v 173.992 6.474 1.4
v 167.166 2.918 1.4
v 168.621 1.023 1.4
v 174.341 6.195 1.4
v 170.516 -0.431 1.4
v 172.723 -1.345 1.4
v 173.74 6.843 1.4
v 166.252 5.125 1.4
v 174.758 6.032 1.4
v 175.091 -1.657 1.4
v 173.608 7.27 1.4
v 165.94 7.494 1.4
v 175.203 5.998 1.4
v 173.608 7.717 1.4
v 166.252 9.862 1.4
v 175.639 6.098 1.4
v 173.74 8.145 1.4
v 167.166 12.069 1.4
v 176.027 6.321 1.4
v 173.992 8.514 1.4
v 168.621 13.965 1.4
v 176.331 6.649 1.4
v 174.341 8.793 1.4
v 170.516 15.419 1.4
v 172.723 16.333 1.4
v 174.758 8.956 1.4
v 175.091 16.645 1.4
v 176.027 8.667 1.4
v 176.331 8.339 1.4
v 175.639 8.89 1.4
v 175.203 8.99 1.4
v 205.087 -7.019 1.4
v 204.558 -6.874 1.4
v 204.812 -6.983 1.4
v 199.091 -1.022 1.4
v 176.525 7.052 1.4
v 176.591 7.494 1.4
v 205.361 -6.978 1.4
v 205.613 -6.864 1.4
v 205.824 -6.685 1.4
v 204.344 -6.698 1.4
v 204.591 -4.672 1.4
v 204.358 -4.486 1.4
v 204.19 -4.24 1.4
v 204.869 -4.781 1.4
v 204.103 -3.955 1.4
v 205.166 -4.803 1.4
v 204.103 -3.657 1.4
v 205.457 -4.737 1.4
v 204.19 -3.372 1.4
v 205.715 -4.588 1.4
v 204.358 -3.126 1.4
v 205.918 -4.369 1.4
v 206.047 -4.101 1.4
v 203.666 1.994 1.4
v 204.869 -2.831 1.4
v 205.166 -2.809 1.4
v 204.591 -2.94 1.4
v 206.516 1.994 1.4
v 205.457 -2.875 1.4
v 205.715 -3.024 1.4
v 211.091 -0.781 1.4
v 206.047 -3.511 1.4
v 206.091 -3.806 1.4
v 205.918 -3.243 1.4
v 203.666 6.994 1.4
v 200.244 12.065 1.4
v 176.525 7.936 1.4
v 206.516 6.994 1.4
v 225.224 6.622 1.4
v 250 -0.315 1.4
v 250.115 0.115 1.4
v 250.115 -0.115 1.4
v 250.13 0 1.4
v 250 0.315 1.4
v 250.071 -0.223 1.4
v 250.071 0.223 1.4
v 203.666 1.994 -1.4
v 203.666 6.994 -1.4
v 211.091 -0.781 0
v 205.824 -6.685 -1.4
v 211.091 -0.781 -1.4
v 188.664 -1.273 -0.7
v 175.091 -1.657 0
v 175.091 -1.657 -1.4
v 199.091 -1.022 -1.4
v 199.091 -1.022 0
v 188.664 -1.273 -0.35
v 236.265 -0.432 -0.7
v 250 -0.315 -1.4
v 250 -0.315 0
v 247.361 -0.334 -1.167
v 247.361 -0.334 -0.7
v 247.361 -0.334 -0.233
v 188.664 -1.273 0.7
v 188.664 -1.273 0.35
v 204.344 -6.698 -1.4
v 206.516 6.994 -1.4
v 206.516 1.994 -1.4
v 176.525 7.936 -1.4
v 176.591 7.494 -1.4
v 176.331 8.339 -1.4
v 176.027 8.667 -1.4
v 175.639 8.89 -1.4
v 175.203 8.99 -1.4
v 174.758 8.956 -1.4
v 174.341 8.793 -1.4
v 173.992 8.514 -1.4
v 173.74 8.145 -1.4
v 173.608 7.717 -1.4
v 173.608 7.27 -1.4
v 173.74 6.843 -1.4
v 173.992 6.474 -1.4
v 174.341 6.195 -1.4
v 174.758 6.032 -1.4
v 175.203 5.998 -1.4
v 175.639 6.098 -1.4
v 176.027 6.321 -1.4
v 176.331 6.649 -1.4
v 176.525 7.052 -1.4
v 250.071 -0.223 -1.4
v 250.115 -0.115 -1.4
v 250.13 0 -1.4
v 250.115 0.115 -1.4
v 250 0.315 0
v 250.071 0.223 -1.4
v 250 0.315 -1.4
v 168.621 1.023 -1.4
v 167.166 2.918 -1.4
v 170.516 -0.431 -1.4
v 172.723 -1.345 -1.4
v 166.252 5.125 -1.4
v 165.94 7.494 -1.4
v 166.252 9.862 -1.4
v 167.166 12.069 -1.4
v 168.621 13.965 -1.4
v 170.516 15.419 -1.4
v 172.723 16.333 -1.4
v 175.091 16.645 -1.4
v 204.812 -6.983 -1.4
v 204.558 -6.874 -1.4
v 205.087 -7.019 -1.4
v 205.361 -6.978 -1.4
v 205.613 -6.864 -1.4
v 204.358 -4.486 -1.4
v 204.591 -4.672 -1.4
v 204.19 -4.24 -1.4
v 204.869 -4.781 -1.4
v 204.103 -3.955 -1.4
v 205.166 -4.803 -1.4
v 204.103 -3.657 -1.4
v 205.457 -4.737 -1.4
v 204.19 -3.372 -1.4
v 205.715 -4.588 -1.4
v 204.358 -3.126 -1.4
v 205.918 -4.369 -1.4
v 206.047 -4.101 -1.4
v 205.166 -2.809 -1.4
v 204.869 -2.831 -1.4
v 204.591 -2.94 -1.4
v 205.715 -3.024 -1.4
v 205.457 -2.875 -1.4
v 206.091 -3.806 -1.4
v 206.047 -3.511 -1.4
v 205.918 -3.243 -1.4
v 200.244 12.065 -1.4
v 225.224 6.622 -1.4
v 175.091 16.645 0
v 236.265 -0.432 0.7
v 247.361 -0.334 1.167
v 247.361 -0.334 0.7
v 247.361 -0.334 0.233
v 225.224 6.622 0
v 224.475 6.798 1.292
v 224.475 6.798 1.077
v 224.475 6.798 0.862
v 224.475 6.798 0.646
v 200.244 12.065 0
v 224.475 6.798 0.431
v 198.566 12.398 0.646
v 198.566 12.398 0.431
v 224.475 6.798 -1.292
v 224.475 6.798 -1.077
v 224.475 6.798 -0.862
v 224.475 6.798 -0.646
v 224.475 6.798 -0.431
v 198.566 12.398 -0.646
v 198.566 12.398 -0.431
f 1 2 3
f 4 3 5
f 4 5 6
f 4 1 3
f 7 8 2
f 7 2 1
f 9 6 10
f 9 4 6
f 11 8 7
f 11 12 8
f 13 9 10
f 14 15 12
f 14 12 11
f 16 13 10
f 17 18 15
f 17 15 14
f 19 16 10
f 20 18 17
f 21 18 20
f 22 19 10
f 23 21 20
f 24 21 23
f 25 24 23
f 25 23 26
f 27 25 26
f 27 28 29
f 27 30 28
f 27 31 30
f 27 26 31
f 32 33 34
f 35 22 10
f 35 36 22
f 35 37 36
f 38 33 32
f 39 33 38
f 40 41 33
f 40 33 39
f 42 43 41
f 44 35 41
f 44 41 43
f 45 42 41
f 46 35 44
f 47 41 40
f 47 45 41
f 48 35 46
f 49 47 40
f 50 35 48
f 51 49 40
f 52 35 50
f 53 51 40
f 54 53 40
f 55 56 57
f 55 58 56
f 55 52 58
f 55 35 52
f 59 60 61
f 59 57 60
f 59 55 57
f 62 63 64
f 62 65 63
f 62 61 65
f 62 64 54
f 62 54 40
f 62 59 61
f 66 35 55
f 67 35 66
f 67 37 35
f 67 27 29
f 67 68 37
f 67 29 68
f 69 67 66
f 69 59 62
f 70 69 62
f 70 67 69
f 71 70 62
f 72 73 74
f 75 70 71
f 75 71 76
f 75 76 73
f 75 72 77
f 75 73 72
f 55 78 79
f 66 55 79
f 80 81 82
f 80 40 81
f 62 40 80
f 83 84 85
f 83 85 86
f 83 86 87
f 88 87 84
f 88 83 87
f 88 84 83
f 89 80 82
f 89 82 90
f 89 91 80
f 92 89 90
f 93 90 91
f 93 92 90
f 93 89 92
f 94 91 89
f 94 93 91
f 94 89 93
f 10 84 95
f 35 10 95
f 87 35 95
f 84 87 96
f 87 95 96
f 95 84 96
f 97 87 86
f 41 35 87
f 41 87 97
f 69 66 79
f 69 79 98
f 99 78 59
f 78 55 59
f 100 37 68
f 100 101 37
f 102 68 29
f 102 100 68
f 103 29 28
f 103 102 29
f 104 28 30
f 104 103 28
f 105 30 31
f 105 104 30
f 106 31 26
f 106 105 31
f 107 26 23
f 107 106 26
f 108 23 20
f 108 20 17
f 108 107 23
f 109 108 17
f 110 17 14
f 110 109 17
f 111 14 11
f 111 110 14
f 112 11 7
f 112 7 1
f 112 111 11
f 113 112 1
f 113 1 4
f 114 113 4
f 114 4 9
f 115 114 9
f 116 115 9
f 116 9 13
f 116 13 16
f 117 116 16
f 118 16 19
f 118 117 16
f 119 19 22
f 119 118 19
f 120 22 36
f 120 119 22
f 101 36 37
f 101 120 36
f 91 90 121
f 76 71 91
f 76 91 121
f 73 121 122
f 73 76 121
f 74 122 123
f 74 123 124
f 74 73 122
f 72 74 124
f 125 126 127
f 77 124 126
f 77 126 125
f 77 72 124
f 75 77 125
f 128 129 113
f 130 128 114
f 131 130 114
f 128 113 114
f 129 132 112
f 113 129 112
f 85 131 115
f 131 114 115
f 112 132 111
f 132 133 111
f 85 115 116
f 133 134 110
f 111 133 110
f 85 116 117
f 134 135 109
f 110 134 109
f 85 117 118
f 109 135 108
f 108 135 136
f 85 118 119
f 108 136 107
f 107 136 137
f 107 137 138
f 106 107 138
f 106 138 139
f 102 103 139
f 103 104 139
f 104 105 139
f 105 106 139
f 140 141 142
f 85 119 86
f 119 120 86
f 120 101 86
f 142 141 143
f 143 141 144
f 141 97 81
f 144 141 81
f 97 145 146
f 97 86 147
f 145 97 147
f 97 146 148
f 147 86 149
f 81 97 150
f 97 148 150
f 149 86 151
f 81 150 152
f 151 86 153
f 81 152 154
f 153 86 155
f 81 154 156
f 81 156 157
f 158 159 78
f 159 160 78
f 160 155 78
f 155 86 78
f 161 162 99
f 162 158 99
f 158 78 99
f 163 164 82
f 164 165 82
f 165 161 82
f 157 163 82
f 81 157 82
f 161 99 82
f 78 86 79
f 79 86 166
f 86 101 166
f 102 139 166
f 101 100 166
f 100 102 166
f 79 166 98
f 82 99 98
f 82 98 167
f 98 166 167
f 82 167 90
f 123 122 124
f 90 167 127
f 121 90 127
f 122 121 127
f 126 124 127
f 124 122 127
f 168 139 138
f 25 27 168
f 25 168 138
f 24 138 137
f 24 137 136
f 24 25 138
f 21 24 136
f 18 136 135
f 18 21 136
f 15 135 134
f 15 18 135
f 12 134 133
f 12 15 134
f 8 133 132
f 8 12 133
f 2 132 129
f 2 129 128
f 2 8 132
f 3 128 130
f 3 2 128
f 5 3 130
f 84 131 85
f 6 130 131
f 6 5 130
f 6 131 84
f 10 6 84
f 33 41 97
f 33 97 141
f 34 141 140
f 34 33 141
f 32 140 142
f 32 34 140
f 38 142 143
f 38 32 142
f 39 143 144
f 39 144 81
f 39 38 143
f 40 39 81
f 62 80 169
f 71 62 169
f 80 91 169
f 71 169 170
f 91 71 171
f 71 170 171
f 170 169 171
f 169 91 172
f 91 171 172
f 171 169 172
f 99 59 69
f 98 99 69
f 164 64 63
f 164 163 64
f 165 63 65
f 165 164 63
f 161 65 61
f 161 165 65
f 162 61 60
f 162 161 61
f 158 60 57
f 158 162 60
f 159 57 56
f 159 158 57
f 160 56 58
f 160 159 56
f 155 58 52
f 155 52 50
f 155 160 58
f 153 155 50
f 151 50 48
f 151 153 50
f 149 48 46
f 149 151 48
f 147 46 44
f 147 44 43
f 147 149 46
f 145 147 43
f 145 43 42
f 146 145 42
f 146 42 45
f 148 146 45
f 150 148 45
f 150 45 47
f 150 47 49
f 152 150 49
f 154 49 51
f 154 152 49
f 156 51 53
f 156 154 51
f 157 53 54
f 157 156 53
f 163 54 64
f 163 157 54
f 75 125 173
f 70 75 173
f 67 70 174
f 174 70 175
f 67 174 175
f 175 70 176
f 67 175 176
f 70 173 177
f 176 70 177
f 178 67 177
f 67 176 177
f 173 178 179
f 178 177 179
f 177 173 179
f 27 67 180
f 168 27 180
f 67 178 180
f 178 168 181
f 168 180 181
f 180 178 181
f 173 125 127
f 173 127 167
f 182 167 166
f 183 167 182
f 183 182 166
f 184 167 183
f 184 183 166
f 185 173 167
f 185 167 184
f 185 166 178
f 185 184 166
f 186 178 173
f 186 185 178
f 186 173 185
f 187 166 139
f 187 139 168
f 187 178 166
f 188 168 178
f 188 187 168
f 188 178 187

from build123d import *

# Parameters (mm, degrees)
SKETCH_1_R      = 1
SKETCH_1_R_2    = 1.5
SKETCH_1_W      = 2.85
SKETCH_1_H      = 5
EXTRUDE_1_DEPTH = 1.4


with BuildPart() as part:
    # Эскиз1 → Бобышка-Вытянуть1 (new, symmetric)
    with BuildSketch(Plane.XY):
        with BuildLine():
            ThreePointArc((175.091334091, 16.644787515), (168.620686799, 13.96455765), (165.940456932, 7.493910359))
            ThreePointArc((165.940456932, 7.493910359), (168.620686797, 1.023263065), (175.091334091, -1.656966802))
            add(Edge.make_bspline(
                [(175.091334091, -1.656966802), (177.330680613, -1.588466601), (181.854695323, -1.455127256), (188.663234462, -1.270383377), (194.423908611, -1.128102082), (197.899847219, -1.04871935), (199.091334091, -1.02226769)],
                knots=[0.704401069, 0.704401069, 0.704401069, 0.704401069, 0.730918775, 0.757971338, 0.785017763, 0.79912389, 0.79912389, 0.79912389, 0.79912389], degree=3))
            Line((199.091334091, -1.02226769), (204.343876183, -6.698358978))
            ThreePointArc((204.343876183, -6.698358978), (205.086913668, -7.019125459), (205.824005665, -6.684923086))
            Line((205.824005665, -6.684923086), (211.091334091, -0.78138581))
            add(Edge.make_bspline(
                [(211.091334091, -0.78138581), (215.029550732, -0.71061193), (221.226120504, -0.611852577), (229.617630172, -0.50292618), (236.087353854, -0.431514192), (241.980776913, -0.376520461), (246.558970011, -0.339535886), (249.120490965, -0.321271242), (250, -0.315)],
                knots=[0.846478182, 0.846478182, 0.846478182, 0.846478182, 0.893099152, 0.919831065, 0.945809917, 0.969680601, 0.989589706, 1, 1, 1, 1], degree=3))
            ThreePointArc((250, -0.315), (250.130477272, 0), (250, 0.315))
            add(Edge.make_bspline(
                [(250, 0.315), (249.15566774, 0.545019818), (246.720175698, 1.208516243), (242.391332083, 2.358339053), (236.849761204, 3.787625364), (230.779918279, 5.298008837), (224.455917947, 6.812866028), (218.030543496, 8.291610632), (211.562405045, 9.719735057), (205.072411509, 11.092374932), (198.567970913, 12.407850726), (192.052369914, 13.665297924), (185.527619973, 14.864093303), (179.872800983, 15.850364437), (176.392239334, 16.431323122), (175.091334091, 16.644787515)],
                knots=[0, 0, 0, 0, 0.0101622, 0.029313053, 0.052011605, 0.076619468, 0.101948061, 0.127526132, 0.153184131, 0.178867888, 0.204557903, 0.230245712, 0.255925967, 0.281594302, 0.296903142, 0.296903142, 0.296903142, 0.296903142], degree=3))
        make_face()
        with Locations((205.091334091, -3.806089643)):
            Circle(SKETCH_1_R, mode=Mode.SUBTRACT)
        with Locations((175.091334091, 7.493910357)):
            Circle(SKETCH_1_R_2, mode=Mode.SUBTRACT)
        with Locations((205.091334091, 4.493910357)):
            Rectangle(SKETCH_1_W, SKETCH_1_H, mode=Mode.SUBTRACT)
    extrude(amount=EXTRUDE_1_DEPTH, both=True)


solid = part.part
